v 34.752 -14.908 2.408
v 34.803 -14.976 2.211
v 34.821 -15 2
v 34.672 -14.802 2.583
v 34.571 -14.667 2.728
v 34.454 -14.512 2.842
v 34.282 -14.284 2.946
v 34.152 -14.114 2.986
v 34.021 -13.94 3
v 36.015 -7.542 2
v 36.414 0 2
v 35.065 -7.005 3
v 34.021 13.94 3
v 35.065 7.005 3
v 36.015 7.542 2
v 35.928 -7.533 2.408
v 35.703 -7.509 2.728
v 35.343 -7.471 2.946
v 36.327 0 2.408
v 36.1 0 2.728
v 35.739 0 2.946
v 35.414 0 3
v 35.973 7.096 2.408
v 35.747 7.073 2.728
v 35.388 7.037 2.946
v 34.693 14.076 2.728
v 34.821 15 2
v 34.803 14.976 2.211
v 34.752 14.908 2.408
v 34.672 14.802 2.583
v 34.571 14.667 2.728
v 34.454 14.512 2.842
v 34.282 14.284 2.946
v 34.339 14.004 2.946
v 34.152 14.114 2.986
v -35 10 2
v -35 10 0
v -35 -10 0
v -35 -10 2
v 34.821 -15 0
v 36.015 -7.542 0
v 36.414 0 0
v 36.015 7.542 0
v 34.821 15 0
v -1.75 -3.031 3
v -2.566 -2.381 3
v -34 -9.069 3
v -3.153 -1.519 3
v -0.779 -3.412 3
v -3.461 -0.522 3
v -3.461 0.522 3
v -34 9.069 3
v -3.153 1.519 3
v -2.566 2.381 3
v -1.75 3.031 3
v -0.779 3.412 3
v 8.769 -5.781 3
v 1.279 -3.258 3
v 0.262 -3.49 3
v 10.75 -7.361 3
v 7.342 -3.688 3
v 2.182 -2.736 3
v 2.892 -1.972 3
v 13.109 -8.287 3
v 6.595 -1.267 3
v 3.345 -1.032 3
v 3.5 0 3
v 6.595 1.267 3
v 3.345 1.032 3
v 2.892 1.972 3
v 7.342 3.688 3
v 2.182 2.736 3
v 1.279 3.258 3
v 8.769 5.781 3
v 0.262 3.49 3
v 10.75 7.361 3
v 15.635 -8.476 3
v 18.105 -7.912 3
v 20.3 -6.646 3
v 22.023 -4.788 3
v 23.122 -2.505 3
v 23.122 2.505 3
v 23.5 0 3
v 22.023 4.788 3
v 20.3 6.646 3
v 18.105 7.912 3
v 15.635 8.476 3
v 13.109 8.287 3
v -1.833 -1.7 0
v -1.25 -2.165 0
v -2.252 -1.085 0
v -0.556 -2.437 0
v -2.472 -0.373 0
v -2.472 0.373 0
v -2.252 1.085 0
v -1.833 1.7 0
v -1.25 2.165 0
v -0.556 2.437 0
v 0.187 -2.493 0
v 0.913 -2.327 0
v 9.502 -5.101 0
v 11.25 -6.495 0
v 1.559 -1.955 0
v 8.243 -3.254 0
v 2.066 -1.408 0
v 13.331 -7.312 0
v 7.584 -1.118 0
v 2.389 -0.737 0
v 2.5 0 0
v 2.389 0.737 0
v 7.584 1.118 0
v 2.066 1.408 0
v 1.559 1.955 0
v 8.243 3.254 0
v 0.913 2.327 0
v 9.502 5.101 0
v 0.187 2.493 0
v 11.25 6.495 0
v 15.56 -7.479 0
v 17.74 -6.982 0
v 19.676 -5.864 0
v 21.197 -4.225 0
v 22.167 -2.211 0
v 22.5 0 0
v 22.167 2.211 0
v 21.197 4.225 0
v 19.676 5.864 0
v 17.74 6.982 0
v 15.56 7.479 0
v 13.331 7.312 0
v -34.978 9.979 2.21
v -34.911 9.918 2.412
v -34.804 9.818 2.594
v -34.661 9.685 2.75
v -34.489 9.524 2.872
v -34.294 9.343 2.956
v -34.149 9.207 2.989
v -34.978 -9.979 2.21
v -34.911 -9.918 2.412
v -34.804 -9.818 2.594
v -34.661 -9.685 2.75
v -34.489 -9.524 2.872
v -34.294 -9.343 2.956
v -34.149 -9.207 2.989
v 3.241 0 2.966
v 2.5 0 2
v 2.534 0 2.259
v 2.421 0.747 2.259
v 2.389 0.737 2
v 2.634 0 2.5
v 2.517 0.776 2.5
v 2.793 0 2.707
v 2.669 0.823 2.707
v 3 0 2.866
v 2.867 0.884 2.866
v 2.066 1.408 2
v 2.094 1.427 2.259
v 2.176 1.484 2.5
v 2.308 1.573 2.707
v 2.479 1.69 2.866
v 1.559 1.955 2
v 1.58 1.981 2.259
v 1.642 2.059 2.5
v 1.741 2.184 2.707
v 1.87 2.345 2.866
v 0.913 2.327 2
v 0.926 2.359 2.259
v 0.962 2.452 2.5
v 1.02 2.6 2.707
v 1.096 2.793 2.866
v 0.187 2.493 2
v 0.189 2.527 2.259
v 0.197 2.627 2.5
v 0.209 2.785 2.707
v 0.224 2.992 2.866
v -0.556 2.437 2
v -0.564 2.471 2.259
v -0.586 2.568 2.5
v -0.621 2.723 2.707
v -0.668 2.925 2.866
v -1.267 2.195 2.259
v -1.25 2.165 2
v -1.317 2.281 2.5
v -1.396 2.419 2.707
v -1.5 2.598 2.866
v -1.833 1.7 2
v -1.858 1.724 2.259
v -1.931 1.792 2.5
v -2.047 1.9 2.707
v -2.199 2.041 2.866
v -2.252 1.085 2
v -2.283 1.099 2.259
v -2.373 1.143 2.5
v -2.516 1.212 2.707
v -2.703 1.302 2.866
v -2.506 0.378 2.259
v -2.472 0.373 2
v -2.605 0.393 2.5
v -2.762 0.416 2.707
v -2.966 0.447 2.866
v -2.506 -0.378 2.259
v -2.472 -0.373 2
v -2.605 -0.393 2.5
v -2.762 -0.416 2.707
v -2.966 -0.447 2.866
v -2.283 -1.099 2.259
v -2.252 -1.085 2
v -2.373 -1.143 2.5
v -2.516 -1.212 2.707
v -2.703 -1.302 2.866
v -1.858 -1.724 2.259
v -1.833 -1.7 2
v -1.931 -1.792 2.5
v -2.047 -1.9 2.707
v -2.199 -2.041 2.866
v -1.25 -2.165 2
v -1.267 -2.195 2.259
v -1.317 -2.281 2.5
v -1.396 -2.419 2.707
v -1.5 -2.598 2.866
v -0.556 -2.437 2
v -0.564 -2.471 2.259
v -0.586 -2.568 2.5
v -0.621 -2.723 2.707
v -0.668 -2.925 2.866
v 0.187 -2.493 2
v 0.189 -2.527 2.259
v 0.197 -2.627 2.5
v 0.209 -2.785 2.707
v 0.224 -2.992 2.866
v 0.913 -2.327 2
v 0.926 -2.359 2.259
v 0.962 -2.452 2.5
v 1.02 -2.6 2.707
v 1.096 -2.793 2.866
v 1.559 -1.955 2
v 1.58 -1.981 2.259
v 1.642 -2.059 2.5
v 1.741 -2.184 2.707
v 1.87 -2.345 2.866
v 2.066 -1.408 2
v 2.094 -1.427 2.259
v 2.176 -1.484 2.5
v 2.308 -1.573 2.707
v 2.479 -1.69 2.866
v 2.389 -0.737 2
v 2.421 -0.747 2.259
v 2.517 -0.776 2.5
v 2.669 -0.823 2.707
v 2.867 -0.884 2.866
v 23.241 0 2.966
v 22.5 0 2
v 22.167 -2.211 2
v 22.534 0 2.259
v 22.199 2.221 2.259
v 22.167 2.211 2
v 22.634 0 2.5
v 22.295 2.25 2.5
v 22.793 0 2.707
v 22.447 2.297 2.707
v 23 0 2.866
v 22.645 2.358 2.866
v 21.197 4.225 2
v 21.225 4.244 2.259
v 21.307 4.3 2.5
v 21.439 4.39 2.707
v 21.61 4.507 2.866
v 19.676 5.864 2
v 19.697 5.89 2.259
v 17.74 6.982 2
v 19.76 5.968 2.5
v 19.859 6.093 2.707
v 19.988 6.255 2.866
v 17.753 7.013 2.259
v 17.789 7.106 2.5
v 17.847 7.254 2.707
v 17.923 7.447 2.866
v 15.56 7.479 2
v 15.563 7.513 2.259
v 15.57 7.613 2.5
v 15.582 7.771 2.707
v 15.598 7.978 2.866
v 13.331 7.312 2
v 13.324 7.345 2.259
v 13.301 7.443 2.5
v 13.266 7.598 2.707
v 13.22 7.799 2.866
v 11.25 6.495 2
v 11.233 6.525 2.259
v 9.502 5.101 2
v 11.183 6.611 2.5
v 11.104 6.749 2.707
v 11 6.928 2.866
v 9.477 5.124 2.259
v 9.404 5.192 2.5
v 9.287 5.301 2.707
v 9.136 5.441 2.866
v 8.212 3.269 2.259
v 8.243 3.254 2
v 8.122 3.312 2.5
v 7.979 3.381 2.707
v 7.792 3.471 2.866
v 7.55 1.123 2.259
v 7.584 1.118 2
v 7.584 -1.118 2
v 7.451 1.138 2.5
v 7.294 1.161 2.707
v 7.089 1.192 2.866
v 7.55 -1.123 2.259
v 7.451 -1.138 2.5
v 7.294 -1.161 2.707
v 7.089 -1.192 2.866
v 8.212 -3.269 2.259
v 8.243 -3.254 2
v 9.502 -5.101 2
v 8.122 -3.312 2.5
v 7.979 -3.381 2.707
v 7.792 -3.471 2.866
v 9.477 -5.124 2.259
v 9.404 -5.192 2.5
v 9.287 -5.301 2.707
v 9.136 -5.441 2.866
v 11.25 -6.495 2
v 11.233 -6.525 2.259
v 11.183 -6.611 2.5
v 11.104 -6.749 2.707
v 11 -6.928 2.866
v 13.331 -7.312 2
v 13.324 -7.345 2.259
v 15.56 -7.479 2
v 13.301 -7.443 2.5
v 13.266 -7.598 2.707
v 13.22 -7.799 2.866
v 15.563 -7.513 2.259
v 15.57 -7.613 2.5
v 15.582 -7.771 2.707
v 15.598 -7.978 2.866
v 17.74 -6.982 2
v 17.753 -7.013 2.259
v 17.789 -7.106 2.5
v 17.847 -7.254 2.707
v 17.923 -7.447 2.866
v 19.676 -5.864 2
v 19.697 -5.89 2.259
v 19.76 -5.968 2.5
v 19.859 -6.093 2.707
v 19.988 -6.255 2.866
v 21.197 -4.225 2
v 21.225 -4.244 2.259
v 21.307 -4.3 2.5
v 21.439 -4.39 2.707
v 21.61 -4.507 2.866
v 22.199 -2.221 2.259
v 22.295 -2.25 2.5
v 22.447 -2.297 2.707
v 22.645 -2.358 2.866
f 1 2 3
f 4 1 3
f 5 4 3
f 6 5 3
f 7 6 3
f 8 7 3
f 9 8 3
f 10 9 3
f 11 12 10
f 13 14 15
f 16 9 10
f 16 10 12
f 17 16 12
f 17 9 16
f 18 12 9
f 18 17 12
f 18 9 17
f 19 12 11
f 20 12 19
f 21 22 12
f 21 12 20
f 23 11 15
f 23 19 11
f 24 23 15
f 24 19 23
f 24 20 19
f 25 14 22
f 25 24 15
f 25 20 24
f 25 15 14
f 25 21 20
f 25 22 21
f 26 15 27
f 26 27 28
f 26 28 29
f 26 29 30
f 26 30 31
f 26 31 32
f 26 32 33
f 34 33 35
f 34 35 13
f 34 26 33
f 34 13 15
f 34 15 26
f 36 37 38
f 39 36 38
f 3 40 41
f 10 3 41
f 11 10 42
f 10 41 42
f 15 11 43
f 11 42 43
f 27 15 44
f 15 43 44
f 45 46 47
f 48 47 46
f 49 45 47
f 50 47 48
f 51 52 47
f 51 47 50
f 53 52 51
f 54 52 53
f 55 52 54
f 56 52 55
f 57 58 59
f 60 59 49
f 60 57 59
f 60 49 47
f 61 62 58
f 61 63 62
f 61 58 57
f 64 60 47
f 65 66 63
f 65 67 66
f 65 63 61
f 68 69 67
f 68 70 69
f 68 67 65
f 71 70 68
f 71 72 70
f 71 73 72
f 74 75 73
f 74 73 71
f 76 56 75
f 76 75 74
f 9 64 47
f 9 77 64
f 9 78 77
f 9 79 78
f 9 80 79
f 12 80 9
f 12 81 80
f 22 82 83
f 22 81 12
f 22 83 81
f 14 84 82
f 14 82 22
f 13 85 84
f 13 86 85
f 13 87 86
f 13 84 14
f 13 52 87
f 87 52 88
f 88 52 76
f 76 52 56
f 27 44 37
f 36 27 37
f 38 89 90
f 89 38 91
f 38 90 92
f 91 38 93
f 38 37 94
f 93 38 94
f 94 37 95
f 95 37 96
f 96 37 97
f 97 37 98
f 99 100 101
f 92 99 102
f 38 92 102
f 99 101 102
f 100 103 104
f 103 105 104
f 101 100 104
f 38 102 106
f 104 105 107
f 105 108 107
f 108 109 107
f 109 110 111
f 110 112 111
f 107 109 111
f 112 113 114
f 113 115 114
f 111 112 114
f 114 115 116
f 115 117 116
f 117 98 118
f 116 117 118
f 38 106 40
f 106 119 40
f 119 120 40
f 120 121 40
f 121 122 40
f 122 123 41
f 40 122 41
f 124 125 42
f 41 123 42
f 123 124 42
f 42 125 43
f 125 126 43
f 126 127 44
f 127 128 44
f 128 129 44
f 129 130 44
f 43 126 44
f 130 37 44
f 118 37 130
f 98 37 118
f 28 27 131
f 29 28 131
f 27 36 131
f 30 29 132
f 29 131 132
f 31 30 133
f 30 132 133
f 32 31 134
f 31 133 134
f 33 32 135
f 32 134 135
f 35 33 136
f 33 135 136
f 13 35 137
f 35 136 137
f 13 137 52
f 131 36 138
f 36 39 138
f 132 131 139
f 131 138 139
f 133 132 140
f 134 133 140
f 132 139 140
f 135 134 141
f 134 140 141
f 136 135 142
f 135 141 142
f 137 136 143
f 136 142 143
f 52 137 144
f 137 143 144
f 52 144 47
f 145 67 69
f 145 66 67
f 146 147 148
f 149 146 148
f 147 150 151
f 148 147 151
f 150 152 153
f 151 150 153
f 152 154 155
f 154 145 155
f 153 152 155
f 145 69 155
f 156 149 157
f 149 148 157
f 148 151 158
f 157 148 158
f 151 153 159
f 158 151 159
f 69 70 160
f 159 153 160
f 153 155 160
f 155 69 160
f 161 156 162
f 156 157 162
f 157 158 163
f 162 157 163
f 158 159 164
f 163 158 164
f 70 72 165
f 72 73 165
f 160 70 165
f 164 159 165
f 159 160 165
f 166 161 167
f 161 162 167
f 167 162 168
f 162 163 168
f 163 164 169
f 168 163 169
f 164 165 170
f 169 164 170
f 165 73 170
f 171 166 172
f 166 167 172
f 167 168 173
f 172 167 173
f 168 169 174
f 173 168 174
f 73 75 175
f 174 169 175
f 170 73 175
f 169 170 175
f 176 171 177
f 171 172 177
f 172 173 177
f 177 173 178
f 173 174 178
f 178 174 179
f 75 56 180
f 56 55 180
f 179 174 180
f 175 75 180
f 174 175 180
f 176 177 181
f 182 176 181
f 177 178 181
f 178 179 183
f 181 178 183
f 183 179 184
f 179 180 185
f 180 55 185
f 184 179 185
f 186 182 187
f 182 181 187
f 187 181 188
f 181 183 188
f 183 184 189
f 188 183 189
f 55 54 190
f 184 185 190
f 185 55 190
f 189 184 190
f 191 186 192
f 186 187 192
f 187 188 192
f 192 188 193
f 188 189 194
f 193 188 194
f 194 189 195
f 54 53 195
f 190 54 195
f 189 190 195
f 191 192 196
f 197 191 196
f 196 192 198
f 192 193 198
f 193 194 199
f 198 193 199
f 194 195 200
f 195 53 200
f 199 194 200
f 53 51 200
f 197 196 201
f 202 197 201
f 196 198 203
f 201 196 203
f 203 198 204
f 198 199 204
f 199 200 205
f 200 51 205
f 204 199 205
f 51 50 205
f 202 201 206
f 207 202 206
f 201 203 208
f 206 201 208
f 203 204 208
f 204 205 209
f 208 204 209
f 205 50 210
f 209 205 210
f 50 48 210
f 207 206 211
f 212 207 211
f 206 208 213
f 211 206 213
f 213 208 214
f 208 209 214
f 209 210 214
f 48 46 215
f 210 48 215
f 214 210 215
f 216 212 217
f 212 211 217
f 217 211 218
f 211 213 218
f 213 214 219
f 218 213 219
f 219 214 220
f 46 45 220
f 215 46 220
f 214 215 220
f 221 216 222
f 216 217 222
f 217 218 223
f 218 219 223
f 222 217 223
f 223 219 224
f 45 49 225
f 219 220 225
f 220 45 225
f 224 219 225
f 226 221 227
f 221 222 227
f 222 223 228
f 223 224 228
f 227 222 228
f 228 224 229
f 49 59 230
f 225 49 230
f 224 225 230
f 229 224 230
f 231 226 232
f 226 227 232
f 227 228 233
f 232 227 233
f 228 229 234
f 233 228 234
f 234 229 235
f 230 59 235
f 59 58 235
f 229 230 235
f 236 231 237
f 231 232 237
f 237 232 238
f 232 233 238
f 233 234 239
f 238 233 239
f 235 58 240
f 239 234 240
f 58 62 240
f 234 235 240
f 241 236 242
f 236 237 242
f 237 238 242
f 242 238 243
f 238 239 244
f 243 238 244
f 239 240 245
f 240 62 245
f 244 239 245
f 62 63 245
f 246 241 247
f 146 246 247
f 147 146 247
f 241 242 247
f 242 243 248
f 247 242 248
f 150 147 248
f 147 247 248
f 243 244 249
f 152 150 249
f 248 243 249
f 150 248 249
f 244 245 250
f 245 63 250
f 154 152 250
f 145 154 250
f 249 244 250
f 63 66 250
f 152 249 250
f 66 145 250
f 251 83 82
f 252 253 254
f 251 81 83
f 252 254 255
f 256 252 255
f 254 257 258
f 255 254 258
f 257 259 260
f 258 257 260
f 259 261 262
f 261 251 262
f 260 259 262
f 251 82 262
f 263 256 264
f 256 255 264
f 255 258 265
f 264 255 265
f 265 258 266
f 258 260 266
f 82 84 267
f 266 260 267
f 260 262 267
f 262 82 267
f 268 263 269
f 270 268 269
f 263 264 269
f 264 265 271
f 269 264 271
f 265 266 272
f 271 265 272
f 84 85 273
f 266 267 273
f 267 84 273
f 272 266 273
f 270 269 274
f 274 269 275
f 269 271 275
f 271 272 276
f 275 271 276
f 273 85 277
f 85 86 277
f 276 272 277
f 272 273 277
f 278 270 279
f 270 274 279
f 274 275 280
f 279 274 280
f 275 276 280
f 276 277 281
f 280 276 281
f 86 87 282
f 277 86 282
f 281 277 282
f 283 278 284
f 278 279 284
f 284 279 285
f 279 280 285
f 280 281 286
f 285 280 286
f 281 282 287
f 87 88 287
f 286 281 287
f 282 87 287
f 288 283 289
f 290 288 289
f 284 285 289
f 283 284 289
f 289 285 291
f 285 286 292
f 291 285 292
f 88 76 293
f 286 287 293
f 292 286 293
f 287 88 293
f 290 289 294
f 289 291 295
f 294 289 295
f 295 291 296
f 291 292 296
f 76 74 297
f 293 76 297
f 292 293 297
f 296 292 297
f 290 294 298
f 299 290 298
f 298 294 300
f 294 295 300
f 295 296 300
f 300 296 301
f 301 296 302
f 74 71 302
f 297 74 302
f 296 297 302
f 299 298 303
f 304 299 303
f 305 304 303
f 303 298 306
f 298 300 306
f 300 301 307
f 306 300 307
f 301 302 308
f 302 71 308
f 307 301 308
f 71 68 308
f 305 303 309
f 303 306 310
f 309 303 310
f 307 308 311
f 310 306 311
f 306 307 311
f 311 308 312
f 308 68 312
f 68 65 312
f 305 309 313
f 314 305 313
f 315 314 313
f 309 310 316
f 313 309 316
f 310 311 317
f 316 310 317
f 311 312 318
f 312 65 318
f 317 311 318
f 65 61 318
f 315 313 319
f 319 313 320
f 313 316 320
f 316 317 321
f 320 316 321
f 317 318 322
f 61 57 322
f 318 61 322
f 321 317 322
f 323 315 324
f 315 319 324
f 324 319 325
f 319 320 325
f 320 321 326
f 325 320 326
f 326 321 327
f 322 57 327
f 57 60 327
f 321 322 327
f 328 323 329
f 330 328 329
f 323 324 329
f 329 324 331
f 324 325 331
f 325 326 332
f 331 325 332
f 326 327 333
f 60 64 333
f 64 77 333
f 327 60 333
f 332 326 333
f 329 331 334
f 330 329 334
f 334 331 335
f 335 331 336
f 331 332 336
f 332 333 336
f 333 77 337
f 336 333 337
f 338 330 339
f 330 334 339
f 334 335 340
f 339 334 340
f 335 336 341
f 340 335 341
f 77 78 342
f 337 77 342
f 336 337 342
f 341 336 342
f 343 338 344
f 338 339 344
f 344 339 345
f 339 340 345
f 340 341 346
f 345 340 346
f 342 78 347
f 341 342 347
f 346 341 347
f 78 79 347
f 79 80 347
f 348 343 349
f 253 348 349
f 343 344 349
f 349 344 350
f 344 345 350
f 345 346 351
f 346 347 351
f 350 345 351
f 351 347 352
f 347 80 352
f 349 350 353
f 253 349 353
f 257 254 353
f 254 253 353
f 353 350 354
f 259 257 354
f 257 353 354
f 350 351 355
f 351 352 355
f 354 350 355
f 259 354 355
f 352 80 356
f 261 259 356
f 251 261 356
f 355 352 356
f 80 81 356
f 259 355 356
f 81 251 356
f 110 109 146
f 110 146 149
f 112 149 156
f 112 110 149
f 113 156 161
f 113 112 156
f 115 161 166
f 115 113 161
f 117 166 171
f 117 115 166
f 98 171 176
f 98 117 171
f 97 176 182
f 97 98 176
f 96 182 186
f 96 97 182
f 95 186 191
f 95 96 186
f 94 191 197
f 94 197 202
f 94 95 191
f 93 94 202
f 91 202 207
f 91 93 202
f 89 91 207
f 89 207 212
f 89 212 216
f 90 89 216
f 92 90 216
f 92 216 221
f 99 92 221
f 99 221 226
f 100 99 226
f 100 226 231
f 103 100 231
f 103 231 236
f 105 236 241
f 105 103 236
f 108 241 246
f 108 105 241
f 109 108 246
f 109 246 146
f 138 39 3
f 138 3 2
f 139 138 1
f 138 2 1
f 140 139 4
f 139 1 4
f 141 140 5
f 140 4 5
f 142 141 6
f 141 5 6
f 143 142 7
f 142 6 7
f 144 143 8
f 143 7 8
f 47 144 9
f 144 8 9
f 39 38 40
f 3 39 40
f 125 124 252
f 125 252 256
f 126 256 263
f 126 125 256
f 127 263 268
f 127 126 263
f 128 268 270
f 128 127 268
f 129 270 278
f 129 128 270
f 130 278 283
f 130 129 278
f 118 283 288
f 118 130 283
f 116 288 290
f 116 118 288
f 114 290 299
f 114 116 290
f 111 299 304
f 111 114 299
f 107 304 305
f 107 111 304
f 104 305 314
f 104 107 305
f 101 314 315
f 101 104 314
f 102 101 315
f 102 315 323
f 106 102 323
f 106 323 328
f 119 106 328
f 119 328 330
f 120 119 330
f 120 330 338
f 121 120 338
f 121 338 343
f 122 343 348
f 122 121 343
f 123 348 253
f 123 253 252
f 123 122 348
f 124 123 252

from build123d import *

# Parameters (mm, degrees)
F0_R     = 2.5
F0_R_2   = 7.5
F1_DEPTH = 3
F2_R     = 1


with BuildPart() as f1:
    # F0 (on Top) → F1 (new body)
    with BuildSketch(Plane.XY):
        with BuildLine():
            ThreePointArc((34.8212002188, -15), (36.4142842854, 0), (34.8212002188, 15))
            Line((34.8212002188, 15), (-35, 10))
            Line((-35, 10), (-35, -10))
            Line((-35, -10), (34.8212002188, -15))
        make_face()
        Circle(F0_R, mode=Mode.SUBTRACT)
        with Locations((15, 0)):
            Circle(F0_R_2, mode=Mode.SUBTRACT)
    extrude(amount=F1_DEPTH)

    # F2
    f2_edges = [f1.edges().sort_by_distance(p)[0] for p in [
        (-35, 0, 3),
        (-0.0894, -12.5, 3),
        (36.414284, 0, 3),
        (-0.0894, 12.5, 3),
        (-2.5, 0, 3),
        (7.5, 0, 3),
    ]]
    fillet(f2_edges, radius=F2_R)


solid = f1.part
